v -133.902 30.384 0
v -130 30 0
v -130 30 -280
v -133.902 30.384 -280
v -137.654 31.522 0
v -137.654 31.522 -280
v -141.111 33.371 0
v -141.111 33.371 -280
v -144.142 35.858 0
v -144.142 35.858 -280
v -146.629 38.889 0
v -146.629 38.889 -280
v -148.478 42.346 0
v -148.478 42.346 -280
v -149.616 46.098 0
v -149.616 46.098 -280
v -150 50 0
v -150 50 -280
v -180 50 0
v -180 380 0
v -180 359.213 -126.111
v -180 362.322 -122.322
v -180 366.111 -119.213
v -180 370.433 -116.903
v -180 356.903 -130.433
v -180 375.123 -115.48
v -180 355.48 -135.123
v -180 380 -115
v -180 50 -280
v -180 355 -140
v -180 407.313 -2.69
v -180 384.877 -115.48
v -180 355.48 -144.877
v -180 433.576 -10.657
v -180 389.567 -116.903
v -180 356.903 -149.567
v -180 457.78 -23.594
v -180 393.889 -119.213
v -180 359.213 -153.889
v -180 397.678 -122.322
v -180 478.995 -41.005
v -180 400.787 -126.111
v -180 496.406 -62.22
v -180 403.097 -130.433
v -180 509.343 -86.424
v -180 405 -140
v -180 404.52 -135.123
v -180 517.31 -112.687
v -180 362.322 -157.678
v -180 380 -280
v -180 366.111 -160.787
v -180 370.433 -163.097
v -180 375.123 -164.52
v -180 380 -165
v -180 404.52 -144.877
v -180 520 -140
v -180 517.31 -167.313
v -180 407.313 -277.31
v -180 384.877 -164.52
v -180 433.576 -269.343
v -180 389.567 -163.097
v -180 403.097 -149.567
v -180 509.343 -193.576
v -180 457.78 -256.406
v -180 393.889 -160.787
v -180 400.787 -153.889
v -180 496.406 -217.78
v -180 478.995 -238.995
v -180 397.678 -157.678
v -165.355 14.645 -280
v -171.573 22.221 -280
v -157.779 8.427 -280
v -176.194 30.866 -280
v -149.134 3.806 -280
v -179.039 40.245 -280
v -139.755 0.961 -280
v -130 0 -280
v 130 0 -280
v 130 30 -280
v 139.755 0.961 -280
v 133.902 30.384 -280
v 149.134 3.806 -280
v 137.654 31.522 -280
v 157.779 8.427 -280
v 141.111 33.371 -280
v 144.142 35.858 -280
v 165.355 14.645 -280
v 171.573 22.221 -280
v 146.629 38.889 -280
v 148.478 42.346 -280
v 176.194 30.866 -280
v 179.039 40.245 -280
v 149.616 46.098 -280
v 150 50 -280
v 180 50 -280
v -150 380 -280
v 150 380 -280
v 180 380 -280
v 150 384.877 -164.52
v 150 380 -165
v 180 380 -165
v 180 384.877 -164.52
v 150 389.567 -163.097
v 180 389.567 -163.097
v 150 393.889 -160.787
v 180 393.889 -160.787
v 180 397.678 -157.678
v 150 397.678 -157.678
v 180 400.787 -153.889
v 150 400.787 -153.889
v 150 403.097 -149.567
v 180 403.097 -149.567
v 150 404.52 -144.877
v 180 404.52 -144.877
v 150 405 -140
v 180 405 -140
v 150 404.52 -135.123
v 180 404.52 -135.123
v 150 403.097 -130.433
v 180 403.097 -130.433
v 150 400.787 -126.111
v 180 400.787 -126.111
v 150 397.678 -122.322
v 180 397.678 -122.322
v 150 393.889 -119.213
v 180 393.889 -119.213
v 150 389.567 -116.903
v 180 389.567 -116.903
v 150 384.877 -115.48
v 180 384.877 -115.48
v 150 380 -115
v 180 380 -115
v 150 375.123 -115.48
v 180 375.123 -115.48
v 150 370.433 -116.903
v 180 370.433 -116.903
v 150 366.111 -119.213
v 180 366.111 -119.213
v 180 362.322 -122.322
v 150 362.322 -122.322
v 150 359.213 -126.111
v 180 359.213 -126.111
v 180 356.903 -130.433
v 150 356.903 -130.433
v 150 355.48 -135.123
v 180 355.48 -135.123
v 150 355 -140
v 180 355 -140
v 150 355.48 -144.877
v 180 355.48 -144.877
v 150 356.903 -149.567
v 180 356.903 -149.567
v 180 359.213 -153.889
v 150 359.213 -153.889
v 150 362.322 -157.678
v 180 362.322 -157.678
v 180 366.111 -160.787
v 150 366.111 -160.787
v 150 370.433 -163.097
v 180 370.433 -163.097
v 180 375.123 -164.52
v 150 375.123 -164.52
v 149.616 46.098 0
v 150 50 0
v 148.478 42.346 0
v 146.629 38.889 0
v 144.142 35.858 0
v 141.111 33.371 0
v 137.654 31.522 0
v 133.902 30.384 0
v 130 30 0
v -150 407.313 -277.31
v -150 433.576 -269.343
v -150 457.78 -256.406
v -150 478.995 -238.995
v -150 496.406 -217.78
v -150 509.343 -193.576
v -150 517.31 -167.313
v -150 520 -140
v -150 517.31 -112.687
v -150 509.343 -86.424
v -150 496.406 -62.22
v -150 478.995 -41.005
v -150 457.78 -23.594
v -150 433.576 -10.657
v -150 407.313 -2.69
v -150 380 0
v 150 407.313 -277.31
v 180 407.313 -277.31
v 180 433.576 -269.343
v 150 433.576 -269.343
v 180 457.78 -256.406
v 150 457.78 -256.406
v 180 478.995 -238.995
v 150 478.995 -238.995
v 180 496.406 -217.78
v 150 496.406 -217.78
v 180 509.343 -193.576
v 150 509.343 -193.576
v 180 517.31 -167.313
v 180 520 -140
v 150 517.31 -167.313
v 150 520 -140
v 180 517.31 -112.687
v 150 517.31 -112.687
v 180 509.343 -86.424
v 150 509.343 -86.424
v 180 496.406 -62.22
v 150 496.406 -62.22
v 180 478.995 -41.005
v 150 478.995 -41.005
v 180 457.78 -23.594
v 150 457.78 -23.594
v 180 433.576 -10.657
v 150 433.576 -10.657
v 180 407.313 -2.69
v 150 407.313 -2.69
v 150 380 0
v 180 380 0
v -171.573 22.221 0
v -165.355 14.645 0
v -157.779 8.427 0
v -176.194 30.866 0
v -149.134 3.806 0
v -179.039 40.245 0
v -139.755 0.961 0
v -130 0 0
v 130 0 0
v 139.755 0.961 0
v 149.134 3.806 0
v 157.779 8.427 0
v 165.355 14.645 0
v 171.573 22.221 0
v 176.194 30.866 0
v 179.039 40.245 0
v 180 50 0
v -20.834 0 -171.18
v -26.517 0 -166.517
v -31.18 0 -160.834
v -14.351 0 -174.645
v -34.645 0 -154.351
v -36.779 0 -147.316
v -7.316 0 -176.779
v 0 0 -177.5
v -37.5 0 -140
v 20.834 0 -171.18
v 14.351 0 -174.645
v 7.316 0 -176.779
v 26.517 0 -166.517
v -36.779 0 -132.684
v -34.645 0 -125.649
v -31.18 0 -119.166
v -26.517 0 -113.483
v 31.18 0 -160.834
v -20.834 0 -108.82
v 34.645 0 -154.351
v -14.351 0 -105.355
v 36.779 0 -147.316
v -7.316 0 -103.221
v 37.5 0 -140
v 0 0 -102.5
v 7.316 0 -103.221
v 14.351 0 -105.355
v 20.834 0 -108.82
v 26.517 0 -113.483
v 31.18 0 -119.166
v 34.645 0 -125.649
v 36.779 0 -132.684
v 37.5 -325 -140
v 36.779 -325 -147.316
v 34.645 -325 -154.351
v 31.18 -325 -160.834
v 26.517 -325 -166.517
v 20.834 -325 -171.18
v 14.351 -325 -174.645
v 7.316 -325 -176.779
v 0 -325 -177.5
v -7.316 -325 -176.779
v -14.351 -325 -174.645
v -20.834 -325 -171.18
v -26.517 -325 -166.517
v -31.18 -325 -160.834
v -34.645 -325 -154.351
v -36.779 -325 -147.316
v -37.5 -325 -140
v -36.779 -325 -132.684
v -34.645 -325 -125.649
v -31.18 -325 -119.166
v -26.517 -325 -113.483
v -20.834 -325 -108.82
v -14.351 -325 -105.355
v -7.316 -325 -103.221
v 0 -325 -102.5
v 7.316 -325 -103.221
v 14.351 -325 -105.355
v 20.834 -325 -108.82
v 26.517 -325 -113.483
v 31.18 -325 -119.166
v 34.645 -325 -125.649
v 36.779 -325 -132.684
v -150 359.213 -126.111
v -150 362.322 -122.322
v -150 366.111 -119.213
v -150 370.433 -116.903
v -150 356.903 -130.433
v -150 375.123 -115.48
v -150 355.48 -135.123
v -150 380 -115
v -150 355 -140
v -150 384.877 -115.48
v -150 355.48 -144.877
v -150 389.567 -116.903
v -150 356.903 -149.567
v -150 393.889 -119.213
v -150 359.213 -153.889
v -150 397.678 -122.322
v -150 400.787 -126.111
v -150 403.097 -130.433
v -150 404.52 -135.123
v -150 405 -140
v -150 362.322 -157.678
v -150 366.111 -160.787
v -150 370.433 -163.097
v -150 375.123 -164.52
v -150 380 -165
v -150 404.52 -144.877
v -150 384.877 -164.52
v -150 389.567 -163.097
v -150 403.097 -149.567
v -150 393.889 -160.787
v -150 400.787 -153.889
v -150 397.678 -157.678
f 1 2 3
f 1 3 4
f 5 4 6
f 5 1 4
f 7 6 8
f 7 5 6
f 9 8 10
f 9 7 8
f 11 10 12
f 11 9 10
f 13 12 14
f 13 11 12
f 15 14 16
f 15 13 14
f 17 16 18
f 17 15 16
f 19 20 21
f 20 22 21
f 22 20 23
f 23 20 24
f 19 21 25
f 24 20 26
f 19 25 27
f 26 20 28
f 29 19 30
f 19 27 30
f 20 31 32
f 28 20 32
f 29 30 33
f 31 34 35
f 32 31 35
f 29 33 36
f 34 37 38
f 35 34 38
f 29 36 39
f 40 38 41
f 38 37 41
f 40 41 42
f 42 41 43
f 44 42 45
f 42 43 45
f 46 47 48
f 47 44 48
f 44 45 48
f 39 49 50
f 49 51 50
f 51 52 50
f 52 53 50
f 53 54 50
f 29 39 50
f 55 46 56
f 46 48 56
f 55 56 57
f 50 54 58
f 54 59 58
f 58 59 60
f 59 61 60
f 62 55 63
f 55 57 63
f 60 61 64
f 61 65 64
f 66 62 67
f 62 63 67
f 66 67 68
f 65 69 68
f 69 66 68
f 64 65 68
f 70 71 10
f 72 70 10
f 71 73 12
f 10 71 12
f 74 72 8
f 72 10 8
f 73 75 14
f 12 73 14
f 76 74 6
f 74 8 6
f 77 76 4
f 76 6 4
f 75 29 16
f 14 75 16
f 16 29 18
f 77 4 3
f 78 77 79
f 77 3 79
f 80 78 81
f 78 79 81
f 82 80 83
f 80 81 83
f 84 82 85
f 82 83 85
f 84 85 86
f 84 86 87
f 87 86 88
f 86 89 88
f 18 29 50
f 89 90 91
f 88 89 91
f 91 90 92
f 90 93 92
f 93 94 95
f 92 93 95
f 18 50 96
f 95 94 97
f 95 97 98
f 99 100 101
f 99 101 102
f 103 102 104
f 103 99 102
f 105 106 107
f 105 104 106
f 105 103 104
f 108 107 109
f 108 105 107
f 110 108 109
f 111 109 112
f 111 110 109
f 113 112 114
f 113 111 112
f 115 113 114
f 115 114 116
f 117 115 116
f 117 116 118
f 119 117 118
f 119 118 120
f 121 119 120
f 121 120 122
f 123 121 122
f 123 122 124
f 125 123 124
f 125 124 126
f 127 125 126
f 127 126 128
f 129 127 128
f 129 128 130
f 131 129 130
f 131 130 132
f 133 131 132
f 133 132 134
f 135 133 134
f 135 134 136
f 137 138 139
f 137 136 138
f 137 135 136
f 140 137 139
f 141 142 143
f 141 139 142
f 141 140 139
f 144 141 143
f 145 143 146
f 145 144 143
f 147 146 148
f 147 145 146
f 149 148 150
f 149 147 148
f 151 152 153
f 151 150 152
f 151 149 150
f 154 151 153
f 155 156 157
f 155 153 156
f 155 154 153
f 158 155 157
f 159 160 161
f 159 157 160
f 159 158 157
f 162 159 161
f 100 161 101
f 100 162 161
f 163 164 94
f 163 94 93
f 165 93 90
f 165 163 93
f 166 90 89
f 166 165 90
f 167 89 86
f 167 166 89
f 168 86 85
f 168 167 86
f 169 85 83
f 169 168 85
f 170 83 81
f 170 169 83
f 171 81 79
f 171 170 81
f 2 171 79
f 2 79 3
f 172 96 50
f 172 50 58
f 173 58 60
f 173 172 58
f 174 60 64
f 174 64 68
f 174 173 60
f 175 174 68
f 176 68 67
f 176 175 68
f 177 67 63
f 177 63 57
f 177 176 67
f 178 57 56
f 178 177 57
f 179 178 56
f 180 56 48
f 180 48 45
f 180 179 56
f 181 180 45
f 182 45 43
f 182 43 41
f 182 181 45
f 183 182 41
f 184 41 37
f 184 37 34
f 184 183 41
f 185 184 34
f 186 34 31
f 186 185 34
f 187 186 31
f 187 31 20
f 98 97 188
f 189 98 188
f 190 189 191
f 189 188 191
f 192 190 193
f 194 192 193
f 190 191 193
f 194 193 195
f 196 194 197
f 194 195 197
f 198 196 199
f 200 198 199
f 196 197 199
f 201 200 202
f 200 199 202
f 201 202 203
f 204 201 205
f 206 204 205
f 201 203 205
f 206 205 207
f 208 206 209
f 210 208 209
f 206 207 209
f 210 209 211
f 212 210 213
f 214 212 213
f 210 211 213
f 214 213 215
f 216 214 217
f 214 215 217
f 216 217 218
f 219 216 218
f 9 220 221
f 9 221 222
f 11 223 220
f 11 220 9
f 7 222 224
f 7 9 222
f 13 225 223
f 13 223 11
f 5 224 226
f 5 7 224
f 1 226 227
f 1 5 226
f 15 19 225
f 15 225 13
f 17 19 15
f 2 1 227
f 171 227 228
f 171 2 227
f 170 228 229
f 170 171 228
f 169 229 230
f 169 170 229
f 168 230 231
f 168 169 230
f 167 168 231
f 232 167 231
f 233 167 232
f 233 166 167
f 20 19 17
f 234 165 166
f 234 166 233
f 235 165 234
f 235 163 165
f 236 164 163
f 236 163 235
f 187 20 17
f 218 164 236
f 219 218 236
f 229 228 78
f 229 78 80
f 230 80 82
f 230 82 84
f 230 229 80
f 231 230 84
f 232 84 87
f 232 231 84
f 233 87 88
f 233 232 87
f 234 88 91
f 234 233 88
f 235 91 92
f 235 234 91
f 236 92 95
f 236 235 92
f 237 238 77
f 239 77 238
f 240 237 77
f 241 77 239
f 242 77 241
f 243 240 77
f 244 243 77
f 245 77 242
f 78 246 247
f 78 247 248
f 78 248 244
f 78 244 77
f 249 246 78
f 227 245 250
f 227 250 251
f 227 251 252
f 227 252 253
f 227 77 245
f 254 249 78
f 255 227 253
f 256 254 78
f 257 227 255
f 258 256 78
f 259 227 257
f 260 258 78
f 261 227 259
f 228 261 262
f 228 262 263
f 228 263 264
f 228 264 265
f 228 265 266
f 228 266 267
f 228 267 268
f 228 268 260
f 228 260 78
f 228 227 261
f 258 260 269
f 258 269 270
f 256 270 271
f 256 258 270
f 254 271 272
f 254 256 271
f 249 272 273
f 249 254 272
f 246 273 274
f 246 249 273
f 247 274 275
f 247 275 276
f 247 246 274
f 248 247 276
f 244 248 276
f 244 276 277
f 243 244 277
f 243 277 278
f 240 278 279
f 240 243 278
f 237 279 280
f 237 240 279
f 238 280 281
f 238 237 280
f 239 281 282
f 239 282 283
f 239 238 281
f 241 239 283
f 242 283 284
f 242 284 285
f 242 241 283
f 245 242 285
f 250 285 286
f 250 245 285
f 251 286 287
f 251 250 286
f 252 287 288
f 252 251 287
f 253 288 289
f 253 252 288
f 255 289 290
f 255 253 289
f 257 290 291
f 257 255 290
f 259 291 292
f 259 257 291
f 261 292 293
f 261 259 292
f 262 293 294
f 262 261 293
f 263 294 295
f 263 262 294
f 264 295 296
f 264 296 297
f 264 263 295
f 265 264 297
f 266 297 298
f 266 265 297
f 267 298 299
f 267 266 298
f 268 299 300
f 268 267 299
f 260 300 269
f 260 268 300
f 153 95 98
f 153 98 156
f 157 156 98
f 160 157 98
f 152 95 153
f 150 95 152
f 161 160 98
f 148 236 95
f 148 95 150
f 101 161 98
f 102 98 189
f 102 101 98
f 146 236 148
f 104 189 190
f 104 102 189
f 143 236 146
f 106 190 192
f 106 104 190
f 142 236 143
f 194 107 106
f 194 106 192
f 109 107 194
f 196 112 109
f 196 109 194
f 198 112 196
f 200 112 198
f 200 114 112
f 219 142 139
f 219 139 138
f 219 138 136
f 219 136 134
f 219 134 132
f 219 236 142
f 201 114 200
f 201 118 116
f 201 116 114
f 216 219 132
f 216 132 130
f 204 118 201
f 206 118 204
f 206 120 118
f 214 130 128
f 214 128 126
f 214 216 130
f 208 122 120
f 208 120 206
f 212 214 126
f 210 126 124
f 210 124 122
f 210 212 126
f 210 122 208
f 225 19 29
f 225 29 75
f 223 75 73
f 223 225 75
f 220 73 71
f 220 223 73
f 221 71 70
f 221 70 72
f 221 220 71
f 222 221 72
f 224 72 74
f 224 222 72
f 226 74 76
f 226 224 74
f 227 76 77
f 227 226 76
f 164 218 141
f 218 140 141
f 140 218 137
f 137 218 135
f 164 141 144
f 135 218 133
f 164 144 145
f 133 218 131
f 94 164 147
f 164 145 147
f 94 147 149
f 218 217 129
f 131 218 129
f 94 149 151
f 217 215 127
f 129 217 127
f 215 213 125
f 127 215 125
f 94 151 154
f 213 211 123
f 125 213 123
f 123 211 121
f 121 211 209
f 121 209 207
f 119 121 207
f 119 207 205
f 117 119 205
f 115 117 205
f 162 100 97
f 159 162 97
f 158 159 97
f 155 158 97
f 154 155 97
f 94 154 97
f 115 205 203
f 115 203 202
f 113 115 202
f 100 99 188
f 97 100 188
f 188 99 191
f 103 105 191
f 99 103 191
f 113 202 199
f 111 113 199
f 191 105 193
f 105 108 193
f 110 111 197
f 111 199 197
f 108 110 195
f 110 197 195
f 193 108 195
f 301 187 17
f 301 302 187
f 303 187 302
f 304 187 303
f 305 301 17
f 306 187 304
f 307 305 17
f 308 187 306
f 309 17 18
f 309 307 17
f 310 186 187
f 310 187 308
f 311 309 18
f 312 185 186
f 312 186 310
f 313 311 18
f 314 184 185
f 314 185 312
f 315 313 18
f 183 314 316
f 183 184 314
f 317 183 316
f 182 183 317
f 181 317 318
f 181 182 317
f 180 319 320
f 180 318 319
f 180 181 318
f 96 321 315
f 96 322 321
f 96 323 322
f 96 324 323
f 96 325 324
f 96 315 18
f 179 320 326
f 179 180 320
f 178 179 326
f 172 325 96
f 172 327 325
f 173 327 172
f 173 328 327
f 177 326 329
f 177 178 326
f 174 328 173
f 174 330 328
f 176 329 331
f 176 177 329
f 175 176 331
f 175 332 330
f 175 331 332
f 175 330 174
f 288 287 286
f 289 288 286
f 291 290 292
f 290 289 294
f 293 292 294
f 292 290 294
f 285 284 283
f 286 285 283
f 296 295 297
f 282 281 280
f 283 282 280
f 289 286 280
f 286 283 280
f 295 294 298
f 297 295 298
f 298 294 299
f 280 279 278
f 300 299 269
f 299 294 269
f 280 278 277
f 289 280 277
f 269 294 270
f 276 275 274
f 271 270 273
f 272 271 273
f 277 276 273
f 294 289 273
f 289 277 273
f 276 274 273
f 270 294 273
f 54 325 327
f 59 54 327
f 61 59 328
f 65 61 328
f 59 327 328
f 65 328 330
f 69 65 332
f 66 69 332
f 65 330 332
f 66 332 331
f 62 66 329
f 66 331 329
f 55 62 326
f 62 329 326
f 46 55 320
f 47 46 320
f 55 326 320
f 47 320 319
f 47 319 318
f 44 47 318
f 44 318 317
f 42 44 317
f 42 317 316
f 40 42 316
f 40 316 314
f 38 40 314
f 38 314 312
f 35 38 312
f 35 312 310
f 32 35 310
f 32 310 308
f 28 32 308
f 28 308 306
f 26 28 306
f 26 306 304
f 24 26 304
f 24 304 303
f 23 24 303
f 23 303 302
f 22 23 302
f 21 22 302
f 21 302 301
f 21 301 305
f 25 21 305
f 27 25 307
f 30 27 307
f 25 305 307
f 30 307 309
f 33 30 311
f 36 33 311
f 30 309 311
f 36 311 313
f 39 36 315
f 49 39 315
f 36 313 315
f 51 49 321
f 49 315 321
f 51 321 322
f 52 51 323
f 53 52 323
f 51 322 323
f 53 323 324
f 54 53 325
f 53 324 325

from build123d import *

# Parameters (mm, degrees)
BOSS_EXTRUDE2_DEPTH     = 280
BOSS_EXTRUDE3_START     = 150
SKETCH5_R               = 140
BOSS_EXTRUDE3_DEPTH     = 30
BOSS_EXTRUDE4_START     = -150
SKETCH5_2_R             = 140
BOSS_EXTRUDE4_DEPTH     = 30
SKETCH6_R               = 25
CUT_EXTRUDE1_DEPTH      = 181
CUT_EXTRUDE1_DEPTH_BACK = 181
SKETCH7_R               = 37.5
BOSS_EXTRUDE5_DEPTH     = 325


with BuildPart() as part:
    # Sketch4 → Boss-Extrude2 (new body)
    with BuildSketch(Plane.XY):
        with BuildLine():
            Line((-130, 0), (130, 0))
            ThreePointArc((130, 0), (165.355339059, 14.644660941), (180, 50))
            Line((180, 50), (180, 380))
            Line((180, 380), (150, 380))
            Line((150, 380), (150, 50))
            ThreePointArc((150, 50), (144.142135624, 35.857864376), (130, 30))
            Line((130, 30), (-130, 30))
            ThreePointArc((-130, 30), (-144.142135624, 35.857864376), (-150, 50))
            Line((-150, 50), (-150, 380))
            Line((-150, 380), (-180, 380))
            Line((-180, 380), (-180, 50))
            ThreePointArc((-180, 50), (-165.355339059, 14.644660941), (-130, 0))
        make_face()
    extrude(amount=-BOSS_EXTRUDE2_DEPTH)

    # Sketch5 → Boss-Extrude3 (add)
    with BuildSketch(Plane(origin=(0, 0, 0), x_dir=(0, 0, -1), z_dir=(1, 0, 0)).offset(BOSS_EXTRUDE3_START)):
        with Locations((140, 380)):
            Circle(SKETCH5_R)
    extrude(amount=BOSS_EXTRUDE3_DEPTH)

    # Sketch5<2> → Boss-Extrude4 (add)
    with BuildSketch(Plane(origin=(0, 0, 0), x_dir=(0, 0, -1), z_dir=(1, 0, 0)).offset(BOSS_EXTRUDE4_START)):
        with Locations((140, 380)):
            Circle(SKETCH5_2_R)
    extrude(amount=-BOSS_EXTRUDE4_DEPTH)

    # Sketch6 → Cut-Extrude1 (cut, two sides)
    with BuildSketch(Plane(origin=(0, 0, 0), x_dir=(0, 0, -1), z_dir=(1, 0, 0))) as cut_extrude1_sk:
        with Locations((140, 380)):
            Circle(SKETCH6_R)
    extrude(amount=CUT_EXTRUDE1_DEPTH, mode=Mode.SUBTRACT)
    extrude(cut_extrude1_sk.sketch, amount=-CUT_EXTRUDE1_DEPTH_BACK, mode=Mode.SUBTRACT)

    # Sketch7 → Boss-Extrude5 (add)
    with BuildSketch(Plane(origin=(0, 0, 0), x_dir=(1, 0, 0), z_dir=(0, 1, 0))):
        with Locations((0, 140)):
            Circle(SKETCH7_R)
    extrude(amount=-BOSS_EXTRUDE5_DEPTH)


solid = part.part
